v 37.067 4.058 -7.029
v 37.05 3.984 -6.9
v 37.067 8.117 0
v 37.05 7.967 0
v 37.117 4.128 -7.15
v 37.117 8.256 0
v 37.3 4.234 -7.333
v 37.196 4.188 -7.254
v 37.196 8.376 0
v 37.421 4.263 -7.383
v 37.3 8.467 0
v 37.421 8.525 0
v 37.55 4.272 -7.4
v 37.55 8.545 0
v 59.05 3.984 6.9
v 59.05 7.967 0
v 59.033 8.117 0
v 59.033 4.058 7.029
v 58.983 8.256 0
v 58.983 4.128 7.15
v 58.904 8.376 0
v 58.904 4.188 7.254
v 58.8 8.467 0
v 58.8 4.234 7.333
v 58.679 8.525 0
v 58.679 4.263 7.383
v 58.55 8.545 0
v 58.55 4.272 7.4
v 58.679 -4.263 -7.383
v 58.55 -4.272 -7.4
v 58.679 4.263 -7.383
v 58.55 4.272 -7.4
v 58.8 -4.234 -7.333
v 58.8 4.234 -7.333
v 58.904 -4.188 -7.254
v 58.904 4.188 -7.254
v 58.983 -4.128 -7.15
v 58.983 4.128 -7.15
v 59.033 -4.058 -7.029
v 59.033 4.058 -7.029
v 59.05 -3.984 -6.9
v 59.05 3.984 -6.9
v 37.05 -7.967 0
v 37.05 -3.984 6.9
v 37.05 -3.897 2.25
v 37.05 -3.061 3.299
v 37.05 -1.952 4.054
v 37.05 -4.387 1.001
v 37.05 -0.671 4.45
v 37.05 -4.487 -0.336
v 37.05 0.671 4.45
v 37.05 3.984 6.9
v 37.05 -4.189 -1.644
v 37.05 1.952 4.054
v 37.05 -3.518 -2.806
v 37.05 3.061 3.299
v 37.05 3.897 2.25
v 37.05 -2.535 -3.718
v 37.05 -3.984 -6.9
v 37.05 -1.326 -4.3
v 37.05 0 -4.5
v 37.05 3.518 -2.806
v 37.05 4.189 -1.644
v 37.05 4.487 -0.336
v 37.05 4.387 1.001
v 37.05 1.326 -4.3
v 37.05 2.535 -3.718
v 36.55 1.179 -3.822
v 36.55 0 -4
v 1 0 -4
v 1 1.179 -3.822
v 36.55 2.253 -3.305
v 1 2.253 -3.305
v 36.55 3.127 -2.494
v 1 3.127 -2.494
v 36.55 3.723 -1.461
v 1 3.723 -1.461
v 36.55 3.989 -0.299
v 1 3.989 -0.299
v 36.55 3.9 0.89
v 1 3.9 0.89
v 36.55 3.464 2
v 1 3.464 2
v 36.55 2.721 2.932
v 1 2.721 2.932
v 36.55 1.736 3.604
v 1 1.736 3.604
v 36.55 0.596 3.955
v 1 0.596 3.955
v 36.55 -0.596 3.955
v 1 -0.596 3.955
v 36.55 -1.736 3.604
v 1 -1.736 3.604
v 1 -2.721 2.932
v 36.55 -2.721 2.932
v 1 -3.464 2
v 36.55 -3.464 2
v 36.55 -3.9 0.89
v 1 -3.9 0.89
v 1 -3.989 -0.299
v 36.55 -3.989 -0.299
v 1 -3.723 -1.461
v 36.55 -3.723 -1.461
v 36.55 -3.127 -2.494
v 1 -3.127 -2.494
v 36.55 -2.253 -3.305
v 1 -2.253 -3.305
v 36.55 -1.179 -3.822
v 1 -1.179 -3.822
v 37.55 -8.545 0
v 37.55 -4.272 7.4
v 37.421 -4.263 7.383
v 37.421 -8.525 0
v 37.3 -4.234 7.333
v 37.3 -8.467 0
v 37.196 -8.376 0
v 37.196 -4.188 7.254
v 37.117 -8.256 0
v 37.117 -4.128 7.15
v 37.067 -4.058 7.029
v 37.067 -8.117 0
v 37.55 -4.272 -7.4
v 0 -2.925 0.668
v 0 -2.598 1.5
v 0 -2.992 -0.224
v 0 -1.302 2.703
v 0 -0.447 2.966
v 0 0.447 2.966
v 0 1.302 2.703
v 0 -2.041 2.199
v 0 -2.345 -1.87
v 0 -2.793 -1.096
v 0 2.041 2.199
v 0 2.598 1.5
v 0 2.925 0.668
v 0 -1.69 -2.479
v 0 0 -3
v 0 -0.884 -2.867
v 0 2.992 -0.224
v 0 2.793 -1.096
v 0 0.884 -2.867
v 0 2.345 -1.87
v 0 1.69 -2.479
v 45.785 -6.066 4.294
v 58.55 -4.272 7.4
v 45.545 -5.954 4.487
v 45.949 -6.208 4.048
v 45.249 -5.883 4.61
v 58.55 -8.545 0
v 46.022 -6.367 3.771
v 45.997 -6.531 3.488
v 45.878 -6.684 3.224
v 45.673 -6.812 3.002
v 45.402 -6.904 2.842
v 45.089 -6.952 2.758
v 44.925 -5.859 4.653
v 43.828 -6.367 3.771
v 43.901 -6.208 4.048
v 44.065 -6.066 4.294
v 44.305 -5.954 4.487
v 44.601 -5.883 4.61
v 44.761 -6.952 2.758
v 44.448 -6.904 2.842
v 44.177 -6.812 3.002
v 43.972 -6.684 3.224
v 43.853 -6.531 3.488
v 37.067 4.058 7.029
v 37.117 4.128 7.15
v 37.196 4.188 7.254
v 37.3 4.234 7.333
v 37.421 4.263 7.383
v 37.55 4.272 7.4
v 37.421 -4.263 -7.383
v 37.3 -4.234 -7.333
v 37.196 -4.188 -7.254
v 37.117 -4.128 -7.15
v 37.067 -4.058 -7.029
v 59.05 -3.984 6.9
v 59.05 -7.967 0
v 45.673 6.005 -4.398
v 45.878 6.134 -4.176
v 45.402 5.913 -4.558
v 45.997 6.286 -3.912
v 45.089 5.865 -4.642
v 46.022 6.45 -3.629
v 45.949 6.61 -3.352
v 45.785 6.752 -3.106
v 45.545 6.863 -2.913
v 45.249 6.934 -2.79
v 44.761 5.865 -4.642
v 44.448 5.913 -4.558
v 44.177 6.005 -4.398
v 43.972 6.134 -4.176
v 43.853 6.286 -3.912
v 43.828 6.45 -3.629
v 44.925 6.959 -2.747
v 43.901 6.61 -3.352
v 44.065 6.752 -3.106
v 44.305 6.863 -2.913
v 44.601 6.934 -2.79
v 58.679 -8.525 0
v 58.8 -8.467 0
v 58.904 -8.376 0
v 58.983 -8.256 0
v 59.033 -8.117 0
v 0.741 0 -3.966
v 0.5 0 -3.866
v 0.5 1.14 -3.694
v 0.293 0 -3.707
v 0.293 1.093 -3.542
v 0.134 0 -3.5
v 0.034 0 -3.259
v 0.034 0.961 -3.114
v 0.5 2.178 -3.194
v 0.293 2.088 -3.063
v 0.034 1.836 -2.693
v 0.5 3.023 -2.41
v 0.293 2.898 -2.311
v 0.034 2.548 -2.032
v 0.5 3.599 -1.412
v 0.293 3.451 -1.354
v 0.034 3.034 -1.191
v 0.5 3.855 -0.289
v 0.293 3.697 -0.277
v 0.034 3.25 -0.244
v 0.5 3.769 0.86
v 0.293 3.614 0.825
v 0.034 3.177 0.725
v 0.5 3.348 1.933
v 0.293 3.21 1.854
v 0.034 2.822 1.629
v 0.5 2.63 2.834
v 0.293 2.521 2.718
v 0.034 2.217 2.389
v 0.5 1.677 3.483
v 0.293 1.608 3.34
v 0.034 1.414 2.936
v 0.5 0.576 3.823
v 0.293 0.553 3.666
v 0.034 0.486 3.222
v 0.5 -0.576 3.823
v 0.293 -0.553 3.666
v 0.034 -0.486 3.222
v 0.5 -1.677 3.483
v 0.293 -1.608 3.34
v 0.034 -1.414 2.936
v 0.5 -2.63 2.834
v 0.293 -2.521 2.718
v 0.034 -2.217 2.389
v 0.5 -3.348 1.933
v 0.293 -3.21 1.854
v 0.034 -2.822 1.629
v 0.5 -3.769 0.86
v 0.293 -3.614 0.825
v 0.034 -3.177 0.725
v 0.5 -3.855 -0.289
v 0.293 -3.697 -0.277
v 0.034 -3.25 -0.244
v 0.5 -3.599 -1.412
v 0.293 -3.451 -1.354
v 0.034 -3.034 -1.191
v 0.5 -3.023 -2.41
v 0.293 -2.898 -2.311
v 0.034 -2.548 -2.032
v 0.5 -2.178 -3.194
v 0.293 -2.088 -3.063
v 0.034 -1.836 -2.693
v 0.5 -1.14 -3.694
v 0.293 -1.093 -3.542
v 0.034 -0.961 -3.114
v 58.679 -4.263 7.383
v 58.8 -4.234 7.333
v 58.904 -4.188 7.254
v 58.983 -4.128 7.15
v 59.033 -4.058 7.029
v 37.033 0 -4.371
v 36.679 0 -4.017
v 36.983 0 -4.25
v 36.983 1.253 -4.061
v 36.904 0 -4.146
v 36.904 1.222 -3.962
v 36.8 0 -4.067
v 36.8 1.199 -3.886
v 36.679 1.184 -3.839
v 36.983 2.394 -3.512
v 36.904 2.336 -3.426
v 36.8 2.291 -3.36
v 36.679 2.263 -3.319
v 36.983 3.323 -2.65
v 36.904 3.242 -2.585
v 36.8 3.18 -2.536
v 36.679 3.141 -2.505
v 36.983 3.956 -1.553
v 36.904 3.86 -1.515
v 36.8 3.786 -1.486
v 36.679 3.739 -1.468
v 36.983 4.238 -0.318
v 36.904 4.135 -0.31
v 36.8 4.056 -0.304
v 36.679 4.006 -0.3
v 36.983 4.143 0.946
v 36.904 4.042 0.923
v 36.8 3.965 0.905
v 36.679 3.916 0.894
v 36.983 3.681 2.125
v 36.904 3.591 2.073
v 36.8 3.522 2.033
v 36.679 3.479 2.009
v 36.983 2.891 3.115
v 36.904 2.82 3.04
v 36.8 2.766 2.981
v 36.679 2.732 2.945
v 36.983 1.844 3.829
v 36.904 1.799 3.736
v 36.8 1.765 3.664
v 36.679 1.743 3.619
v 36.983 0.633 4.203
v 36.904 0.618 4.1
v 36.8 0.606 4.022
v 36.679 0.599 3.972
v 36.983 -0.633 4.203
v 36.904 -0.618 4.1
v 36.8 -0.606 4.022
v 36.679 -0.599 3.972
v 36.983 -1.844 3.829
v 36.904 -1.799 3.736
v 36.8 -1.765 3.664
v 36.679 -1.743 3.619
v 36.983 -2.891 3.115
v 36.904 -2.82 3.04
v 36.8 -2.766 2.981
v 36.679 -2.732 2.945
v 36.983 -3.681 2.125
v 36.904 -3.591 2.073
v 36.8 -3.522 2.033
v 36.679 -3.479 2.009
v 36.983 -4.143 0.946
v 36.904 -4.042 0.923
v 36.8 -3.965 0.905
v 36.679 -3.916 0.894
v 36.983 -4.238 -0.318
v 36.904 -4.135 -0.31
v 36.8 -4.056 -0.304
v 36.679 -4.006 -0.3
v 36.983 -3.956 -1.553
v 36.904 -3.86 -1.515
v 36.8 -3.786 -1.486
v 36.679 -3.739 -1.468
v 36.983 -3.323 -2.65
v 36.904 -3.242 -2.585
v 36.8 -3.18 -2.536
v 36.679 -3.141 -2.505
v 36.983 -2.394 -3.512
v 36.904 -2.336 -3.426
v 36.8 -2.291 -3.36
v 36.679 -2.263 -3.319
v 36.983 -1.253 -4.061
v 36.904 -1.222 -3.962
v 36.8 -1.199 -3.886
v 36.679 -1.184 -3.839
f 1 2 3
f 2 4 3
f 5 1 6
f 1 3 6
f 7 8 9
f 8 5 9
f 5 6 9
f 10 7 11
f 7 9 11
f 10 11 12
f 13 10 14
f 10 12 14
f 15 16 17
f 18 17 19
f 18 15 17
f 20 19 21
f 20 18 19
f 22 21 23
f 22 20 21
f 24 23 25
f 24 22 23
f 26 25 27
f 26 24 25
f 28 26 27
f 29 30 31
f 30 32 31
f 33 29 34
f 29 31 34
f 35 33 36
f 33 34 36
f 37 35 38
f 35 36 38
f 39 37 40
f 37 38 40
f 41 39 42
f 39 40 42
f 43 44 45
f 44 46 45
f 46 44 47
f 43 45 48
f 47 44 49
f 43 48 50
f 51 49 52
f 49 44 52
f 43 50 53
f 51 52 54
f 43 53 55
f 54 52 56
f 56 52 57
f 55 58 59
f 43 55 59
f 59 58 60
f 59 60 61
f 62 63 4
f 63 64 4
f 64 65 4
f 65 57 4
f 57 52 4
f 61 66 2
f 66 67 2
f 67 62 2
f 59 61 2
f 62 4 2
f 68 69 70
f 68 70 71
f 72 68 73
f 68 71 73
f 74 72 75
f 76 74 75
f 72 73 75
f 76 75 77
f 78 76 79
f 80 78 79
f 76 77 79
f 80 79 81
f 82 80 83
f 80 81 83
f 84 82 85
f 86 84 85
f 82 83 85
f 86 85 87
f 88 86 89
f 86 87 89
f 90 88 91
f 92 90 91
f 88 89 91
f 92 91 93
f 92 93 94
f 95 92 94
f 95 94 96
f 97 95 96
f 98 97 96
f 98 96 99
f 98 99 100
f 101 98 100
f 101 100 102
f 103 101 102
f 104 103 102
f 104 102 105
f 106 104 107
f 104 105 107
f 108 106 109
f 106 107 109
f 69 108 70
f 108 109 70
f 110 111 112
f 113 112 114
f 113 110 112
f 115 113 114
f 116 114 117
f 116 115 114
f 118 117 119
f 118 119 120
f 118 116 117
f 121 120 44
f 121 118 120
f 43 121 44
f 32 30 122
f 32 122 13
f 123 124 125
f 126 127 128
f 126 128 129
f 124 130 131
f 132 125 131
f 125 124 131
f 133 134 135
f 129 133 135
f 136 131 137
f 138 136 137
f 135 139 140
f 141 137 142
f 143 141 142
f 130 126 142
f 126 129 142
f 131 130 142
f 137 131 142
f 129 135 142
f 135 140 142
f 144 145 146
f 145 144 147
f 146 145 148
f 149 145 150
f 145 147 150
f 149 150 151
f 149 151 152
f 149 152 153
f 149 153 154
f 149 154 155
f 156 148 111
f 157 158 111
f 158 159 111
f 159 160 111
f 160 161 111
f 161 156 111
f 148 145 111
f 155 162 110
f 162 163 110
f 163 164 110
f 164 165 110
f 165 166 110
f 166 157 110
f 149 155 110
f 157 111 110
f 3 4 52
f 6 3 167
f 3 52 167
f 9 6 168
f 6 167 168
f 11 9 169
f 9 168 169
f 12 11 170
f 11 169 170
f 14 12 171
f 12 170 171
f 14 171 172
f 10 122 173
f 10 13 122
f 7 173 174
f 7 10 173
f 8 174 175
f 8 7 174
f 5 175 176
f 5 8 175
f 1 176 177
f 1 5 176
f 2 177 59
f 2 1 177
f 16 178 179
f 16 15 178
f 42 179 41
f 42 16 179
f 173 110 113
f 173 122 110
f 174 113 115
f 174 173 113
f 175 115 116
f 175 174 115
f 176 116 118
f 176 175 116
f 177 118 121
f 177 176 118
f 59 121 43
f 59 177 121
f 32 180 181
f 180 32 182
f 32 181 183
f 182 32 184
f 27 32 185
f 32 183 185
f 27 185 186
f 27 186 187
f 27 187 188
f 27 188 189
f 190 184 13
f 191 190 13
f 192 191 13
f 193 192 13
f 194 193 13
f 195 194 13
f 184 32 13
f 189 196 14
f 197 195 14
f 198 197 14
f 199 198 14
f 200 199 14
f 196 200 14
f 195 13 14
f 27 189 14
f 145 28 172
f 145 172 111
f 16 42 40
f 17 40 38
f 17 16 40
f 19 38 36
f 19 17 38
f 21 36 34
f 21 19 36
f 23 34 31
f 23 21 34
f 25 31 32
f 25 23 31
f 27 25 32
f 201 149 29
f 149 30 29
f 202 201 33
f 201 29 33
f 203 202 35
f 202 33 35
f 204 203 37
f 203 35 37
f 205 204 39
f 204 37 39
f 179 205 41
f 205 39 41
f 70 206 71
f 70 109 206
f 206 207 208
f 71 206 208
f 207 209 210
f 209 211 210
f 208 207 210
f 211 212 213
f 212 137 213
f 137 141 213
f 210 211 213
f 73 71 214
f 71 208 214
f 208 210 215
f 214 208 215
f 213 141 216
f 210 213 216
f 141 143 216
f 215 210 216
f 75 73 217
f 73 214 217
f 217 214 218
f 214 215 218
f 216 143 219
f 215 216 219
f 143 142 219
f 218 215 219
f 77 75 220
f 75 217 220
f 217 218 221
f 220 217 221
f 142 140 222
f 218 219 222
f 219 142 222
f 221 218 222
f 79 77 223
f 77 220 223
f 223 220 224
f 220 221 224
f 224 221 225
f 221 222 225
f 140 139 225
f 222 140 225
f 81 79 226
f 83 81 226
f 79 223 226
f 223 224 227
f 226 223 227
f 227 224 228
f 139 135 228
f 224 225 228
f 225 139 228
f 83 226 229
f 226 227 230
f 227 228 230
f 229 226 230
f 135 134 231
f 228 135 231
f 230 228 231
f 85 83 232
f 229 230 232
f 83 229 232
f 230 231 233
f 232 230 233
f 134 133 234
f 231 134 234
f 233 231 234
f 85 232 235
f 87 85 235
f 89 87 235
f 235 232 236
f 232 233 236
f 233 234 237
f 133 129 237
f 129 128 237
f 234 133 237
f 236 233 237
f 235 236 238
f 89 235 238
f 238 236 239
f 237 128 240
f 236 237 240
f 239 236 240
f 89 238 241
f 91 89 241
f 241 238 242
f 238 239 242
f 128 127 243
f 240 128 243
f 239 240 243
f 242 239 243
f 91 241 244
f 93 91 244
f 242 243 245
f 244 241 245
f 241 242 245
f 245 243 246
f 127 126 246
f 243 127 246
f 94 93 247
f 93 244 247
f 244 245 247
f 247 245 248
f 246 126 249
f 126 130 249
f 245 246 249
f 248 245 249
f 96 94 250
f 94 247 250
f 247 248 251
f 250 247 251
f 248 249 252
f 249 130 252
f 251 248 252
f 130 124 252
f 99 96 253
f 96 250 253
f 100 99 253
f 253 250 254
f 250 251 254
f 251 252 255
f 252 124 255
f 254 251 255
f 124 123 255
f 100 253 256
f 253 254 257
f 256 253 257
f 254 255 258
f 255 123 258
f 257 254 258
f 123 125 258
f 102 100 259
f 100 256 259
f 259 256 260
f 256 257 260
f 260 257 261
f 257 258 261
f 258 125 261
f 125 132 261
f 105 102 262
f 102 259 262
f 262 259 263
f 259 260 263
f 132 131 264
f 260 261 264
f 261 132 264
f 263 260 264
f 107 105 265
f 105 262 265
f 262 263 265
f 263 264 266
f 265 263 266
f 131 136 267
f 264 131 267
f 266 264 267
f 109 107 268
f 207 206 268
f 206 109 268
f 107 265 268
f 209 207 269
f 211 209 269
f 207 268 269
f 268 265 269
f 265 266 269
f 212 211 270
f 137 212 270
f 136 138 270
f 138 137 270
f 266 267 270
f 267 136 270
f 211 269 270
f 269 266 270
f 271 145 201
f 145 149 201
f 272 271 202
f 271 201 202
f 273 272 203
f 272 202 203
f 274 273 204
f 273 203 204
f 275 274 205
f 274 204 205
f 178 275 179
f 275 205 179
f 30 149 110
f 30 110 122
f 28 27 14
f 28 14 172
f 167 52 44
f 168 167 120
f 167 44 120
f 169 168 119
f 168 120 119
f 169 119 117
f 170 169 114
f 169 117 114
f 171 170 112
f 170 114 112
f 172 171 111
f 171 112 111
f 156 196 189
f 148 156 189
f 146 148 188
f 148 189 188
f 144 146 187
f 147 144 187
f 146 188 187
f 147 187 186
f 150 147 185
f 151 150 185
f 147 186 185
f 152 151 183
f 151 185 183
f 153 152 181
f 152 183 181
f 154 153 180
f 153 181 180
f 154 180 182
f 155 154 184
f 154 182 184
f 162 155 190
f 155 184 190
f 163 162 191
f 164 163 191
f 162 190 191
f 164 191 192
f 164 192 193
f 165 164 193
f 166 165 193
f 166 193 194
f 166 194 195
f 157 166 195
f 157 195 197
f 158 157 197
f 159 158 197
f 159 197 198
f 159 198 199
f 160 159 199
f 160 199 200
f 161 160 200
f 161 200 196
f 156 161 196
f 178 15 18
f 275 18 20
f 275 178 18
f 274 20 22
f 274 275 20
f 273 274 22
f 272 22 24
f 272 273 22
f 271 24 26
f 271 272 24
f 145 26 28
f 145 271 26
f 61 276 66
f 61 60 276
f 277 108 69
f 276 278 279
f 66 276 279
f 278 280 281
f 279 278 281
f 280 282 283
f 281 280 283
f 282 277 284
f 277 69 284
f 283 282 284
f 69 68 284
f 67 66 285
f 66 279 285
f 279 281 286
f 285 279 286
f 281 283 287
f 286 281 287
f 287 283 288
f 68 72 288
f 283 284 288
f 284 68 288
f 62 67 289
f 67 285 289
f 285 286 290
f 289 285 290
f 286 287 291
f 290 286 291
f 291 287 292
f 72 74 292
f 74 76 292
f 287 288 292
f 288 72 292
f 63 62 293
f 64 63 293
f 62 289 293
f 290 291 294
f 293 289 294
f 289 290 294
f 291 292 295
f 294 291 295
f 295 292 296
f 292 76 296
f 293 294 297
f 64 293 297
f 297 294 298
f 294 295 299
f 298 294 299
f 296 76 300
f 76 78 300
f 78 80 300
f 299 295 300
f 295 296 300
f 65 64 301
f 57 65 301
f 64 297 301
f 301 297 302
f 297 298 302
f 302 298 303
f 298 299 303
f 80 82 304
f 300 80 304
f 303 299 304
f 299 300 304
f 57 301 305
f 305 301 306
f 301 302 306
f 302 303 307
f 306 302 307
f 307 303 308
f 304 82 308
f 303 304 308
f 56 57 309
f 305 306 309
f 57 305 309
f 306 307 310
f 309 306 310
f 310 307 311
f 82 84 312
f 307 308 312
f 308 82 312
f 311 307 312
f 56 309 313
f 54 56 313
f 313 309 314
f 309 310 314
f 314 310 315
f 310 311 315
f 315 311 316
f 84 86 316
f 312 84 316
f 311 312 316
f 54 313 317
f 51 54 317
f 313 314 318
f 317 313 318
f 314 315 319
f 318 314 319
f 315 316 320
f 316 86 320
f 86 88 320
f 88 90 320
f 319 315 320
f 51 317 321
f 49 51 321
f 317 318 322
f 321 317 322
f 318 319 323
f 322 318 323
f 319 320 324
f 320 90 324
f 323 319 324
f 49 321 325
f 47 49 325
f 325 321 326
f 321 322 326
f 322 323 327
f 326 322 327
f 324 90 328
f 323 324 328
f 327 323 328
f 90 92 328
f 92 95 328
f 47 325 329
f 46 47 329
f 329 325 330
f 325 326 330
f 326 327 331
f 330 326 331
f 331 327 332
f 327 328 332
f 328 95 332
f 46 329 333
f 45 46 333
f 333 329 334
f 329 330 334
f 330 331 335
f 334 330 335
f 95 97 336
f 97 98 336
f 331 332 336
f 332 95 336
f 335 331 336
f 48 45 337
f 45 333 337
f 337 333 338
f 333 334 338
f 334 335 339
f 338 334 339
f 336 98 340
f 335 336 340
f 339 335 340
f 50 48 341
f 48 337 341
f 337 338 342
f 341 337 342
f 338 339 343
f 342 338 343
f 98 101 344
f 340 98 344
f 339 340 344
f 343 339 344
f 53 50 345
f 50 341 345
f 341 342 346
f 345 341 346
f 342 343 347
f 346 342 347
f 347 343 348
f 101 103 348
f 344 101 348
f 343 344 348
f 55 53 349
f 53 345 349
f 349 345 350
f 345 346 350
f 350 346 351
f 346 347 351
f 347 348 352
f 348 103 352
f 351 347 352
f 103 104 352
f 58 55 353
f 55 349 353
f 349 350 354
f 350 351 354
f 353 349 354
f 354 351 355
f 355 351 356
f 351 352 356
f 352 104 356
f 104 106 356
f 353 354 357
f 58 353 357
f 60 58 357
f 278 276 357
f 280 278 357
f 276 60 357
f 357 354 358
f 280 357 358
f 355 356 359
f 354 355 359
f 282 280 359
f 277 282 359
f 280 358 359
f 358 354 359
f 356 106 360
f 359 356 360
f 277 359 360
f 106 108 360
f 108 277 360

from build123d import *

# Parameters (mm, degrees)
CROQUIS1_R              = 4
SALIENTE_EXTRUIR1_DEPTH = 37.05
SALIENTE_EXTRUIR2_DEPTH = 22
REDONDEO1_R             = 0.5
REDONDEO2_R             = 1
CROQUIS3_R              = 1.1
CORTAR_EXTRUIR1_DEPTH   = 20


with BuildPart() as part:
    # Croquis1 → Saliente-Extruir1 (new body)
    with BuildSketch(Plane(origin=(0, 0, 0), x_dir=(0, 0, -1), z_dir=(1, 0, 0))):
        Circle(CROQUIS1_R)
    extrude(amount=SALIENTE_EXTRUIR1_DEPTH)

    # Croquis2 → Saliente-Extruir2 (add)
    with BuildSketch(Plane(origin=(37.05, 0, 0), x_dir=(0, 0, -1), z_dir=(1, 0, 0))):
        Polygon((0, -8.544783984), (7.4, -4.272391992), (7.4, 4.272391992), (0, 8.544783984), (-7.4, 4.272391992), (-7.4, -4.272391992), align=None)
    extrude(amount=SALIENTE_EXTRUIR2_DEPTH)

    # Redondeo1
    redondeo1_edges = [part.edges().sort_by_distance(p)[0] for p in [
        (37.05, 0, 4),
        (37.05, -6.408587988, 3.7),
        (37.05, -6.408587988, -3.7),
        (37.05, 0, -7.4),
        (37.05, 6.408587988, -3.7),
        (37.05, 6.408587988, 3.7),
        (37.05, 0, 7.4),
        (59.05, -6.408587988, 3.7),
        (59.05, -6.408587988, -3.7),
        (59.05, 0, -7.4),
        (59.05, 6.408587988, -3.7),
        (59.05, 6.408587988, 3.7),
        (59.05, 0, 7.4),
    ]]
    fillet(redondeo1_edges, radius=REDONDEO1_R)

    # Redondeo2
    redondeo2_edges = [part.edges().sort_by_distance(p)[0] for p in [
        (0, 0, 4),
    ]]
    fillet(redondeo2_edges, radius=REDONDEO2_R)

    # Croquis3 → Cortar-Extruir1 (cut)
    with BuildSketch(Plane(origin=(0, 6.408587988, -3.7), x_dir=(1, 0, 0), z_dir=(0, 0.8660254037844386, -0.5000000000000003))):
        with Locations(Location((44.925, 0, 0), (0, 0, 270))):
            Circle(CROQUIS3_R)
    extrude(amount=-CORTAR_EXTRUIR1_DEPTH, mode=Mode.SUBTRACT)


solid = part.part
